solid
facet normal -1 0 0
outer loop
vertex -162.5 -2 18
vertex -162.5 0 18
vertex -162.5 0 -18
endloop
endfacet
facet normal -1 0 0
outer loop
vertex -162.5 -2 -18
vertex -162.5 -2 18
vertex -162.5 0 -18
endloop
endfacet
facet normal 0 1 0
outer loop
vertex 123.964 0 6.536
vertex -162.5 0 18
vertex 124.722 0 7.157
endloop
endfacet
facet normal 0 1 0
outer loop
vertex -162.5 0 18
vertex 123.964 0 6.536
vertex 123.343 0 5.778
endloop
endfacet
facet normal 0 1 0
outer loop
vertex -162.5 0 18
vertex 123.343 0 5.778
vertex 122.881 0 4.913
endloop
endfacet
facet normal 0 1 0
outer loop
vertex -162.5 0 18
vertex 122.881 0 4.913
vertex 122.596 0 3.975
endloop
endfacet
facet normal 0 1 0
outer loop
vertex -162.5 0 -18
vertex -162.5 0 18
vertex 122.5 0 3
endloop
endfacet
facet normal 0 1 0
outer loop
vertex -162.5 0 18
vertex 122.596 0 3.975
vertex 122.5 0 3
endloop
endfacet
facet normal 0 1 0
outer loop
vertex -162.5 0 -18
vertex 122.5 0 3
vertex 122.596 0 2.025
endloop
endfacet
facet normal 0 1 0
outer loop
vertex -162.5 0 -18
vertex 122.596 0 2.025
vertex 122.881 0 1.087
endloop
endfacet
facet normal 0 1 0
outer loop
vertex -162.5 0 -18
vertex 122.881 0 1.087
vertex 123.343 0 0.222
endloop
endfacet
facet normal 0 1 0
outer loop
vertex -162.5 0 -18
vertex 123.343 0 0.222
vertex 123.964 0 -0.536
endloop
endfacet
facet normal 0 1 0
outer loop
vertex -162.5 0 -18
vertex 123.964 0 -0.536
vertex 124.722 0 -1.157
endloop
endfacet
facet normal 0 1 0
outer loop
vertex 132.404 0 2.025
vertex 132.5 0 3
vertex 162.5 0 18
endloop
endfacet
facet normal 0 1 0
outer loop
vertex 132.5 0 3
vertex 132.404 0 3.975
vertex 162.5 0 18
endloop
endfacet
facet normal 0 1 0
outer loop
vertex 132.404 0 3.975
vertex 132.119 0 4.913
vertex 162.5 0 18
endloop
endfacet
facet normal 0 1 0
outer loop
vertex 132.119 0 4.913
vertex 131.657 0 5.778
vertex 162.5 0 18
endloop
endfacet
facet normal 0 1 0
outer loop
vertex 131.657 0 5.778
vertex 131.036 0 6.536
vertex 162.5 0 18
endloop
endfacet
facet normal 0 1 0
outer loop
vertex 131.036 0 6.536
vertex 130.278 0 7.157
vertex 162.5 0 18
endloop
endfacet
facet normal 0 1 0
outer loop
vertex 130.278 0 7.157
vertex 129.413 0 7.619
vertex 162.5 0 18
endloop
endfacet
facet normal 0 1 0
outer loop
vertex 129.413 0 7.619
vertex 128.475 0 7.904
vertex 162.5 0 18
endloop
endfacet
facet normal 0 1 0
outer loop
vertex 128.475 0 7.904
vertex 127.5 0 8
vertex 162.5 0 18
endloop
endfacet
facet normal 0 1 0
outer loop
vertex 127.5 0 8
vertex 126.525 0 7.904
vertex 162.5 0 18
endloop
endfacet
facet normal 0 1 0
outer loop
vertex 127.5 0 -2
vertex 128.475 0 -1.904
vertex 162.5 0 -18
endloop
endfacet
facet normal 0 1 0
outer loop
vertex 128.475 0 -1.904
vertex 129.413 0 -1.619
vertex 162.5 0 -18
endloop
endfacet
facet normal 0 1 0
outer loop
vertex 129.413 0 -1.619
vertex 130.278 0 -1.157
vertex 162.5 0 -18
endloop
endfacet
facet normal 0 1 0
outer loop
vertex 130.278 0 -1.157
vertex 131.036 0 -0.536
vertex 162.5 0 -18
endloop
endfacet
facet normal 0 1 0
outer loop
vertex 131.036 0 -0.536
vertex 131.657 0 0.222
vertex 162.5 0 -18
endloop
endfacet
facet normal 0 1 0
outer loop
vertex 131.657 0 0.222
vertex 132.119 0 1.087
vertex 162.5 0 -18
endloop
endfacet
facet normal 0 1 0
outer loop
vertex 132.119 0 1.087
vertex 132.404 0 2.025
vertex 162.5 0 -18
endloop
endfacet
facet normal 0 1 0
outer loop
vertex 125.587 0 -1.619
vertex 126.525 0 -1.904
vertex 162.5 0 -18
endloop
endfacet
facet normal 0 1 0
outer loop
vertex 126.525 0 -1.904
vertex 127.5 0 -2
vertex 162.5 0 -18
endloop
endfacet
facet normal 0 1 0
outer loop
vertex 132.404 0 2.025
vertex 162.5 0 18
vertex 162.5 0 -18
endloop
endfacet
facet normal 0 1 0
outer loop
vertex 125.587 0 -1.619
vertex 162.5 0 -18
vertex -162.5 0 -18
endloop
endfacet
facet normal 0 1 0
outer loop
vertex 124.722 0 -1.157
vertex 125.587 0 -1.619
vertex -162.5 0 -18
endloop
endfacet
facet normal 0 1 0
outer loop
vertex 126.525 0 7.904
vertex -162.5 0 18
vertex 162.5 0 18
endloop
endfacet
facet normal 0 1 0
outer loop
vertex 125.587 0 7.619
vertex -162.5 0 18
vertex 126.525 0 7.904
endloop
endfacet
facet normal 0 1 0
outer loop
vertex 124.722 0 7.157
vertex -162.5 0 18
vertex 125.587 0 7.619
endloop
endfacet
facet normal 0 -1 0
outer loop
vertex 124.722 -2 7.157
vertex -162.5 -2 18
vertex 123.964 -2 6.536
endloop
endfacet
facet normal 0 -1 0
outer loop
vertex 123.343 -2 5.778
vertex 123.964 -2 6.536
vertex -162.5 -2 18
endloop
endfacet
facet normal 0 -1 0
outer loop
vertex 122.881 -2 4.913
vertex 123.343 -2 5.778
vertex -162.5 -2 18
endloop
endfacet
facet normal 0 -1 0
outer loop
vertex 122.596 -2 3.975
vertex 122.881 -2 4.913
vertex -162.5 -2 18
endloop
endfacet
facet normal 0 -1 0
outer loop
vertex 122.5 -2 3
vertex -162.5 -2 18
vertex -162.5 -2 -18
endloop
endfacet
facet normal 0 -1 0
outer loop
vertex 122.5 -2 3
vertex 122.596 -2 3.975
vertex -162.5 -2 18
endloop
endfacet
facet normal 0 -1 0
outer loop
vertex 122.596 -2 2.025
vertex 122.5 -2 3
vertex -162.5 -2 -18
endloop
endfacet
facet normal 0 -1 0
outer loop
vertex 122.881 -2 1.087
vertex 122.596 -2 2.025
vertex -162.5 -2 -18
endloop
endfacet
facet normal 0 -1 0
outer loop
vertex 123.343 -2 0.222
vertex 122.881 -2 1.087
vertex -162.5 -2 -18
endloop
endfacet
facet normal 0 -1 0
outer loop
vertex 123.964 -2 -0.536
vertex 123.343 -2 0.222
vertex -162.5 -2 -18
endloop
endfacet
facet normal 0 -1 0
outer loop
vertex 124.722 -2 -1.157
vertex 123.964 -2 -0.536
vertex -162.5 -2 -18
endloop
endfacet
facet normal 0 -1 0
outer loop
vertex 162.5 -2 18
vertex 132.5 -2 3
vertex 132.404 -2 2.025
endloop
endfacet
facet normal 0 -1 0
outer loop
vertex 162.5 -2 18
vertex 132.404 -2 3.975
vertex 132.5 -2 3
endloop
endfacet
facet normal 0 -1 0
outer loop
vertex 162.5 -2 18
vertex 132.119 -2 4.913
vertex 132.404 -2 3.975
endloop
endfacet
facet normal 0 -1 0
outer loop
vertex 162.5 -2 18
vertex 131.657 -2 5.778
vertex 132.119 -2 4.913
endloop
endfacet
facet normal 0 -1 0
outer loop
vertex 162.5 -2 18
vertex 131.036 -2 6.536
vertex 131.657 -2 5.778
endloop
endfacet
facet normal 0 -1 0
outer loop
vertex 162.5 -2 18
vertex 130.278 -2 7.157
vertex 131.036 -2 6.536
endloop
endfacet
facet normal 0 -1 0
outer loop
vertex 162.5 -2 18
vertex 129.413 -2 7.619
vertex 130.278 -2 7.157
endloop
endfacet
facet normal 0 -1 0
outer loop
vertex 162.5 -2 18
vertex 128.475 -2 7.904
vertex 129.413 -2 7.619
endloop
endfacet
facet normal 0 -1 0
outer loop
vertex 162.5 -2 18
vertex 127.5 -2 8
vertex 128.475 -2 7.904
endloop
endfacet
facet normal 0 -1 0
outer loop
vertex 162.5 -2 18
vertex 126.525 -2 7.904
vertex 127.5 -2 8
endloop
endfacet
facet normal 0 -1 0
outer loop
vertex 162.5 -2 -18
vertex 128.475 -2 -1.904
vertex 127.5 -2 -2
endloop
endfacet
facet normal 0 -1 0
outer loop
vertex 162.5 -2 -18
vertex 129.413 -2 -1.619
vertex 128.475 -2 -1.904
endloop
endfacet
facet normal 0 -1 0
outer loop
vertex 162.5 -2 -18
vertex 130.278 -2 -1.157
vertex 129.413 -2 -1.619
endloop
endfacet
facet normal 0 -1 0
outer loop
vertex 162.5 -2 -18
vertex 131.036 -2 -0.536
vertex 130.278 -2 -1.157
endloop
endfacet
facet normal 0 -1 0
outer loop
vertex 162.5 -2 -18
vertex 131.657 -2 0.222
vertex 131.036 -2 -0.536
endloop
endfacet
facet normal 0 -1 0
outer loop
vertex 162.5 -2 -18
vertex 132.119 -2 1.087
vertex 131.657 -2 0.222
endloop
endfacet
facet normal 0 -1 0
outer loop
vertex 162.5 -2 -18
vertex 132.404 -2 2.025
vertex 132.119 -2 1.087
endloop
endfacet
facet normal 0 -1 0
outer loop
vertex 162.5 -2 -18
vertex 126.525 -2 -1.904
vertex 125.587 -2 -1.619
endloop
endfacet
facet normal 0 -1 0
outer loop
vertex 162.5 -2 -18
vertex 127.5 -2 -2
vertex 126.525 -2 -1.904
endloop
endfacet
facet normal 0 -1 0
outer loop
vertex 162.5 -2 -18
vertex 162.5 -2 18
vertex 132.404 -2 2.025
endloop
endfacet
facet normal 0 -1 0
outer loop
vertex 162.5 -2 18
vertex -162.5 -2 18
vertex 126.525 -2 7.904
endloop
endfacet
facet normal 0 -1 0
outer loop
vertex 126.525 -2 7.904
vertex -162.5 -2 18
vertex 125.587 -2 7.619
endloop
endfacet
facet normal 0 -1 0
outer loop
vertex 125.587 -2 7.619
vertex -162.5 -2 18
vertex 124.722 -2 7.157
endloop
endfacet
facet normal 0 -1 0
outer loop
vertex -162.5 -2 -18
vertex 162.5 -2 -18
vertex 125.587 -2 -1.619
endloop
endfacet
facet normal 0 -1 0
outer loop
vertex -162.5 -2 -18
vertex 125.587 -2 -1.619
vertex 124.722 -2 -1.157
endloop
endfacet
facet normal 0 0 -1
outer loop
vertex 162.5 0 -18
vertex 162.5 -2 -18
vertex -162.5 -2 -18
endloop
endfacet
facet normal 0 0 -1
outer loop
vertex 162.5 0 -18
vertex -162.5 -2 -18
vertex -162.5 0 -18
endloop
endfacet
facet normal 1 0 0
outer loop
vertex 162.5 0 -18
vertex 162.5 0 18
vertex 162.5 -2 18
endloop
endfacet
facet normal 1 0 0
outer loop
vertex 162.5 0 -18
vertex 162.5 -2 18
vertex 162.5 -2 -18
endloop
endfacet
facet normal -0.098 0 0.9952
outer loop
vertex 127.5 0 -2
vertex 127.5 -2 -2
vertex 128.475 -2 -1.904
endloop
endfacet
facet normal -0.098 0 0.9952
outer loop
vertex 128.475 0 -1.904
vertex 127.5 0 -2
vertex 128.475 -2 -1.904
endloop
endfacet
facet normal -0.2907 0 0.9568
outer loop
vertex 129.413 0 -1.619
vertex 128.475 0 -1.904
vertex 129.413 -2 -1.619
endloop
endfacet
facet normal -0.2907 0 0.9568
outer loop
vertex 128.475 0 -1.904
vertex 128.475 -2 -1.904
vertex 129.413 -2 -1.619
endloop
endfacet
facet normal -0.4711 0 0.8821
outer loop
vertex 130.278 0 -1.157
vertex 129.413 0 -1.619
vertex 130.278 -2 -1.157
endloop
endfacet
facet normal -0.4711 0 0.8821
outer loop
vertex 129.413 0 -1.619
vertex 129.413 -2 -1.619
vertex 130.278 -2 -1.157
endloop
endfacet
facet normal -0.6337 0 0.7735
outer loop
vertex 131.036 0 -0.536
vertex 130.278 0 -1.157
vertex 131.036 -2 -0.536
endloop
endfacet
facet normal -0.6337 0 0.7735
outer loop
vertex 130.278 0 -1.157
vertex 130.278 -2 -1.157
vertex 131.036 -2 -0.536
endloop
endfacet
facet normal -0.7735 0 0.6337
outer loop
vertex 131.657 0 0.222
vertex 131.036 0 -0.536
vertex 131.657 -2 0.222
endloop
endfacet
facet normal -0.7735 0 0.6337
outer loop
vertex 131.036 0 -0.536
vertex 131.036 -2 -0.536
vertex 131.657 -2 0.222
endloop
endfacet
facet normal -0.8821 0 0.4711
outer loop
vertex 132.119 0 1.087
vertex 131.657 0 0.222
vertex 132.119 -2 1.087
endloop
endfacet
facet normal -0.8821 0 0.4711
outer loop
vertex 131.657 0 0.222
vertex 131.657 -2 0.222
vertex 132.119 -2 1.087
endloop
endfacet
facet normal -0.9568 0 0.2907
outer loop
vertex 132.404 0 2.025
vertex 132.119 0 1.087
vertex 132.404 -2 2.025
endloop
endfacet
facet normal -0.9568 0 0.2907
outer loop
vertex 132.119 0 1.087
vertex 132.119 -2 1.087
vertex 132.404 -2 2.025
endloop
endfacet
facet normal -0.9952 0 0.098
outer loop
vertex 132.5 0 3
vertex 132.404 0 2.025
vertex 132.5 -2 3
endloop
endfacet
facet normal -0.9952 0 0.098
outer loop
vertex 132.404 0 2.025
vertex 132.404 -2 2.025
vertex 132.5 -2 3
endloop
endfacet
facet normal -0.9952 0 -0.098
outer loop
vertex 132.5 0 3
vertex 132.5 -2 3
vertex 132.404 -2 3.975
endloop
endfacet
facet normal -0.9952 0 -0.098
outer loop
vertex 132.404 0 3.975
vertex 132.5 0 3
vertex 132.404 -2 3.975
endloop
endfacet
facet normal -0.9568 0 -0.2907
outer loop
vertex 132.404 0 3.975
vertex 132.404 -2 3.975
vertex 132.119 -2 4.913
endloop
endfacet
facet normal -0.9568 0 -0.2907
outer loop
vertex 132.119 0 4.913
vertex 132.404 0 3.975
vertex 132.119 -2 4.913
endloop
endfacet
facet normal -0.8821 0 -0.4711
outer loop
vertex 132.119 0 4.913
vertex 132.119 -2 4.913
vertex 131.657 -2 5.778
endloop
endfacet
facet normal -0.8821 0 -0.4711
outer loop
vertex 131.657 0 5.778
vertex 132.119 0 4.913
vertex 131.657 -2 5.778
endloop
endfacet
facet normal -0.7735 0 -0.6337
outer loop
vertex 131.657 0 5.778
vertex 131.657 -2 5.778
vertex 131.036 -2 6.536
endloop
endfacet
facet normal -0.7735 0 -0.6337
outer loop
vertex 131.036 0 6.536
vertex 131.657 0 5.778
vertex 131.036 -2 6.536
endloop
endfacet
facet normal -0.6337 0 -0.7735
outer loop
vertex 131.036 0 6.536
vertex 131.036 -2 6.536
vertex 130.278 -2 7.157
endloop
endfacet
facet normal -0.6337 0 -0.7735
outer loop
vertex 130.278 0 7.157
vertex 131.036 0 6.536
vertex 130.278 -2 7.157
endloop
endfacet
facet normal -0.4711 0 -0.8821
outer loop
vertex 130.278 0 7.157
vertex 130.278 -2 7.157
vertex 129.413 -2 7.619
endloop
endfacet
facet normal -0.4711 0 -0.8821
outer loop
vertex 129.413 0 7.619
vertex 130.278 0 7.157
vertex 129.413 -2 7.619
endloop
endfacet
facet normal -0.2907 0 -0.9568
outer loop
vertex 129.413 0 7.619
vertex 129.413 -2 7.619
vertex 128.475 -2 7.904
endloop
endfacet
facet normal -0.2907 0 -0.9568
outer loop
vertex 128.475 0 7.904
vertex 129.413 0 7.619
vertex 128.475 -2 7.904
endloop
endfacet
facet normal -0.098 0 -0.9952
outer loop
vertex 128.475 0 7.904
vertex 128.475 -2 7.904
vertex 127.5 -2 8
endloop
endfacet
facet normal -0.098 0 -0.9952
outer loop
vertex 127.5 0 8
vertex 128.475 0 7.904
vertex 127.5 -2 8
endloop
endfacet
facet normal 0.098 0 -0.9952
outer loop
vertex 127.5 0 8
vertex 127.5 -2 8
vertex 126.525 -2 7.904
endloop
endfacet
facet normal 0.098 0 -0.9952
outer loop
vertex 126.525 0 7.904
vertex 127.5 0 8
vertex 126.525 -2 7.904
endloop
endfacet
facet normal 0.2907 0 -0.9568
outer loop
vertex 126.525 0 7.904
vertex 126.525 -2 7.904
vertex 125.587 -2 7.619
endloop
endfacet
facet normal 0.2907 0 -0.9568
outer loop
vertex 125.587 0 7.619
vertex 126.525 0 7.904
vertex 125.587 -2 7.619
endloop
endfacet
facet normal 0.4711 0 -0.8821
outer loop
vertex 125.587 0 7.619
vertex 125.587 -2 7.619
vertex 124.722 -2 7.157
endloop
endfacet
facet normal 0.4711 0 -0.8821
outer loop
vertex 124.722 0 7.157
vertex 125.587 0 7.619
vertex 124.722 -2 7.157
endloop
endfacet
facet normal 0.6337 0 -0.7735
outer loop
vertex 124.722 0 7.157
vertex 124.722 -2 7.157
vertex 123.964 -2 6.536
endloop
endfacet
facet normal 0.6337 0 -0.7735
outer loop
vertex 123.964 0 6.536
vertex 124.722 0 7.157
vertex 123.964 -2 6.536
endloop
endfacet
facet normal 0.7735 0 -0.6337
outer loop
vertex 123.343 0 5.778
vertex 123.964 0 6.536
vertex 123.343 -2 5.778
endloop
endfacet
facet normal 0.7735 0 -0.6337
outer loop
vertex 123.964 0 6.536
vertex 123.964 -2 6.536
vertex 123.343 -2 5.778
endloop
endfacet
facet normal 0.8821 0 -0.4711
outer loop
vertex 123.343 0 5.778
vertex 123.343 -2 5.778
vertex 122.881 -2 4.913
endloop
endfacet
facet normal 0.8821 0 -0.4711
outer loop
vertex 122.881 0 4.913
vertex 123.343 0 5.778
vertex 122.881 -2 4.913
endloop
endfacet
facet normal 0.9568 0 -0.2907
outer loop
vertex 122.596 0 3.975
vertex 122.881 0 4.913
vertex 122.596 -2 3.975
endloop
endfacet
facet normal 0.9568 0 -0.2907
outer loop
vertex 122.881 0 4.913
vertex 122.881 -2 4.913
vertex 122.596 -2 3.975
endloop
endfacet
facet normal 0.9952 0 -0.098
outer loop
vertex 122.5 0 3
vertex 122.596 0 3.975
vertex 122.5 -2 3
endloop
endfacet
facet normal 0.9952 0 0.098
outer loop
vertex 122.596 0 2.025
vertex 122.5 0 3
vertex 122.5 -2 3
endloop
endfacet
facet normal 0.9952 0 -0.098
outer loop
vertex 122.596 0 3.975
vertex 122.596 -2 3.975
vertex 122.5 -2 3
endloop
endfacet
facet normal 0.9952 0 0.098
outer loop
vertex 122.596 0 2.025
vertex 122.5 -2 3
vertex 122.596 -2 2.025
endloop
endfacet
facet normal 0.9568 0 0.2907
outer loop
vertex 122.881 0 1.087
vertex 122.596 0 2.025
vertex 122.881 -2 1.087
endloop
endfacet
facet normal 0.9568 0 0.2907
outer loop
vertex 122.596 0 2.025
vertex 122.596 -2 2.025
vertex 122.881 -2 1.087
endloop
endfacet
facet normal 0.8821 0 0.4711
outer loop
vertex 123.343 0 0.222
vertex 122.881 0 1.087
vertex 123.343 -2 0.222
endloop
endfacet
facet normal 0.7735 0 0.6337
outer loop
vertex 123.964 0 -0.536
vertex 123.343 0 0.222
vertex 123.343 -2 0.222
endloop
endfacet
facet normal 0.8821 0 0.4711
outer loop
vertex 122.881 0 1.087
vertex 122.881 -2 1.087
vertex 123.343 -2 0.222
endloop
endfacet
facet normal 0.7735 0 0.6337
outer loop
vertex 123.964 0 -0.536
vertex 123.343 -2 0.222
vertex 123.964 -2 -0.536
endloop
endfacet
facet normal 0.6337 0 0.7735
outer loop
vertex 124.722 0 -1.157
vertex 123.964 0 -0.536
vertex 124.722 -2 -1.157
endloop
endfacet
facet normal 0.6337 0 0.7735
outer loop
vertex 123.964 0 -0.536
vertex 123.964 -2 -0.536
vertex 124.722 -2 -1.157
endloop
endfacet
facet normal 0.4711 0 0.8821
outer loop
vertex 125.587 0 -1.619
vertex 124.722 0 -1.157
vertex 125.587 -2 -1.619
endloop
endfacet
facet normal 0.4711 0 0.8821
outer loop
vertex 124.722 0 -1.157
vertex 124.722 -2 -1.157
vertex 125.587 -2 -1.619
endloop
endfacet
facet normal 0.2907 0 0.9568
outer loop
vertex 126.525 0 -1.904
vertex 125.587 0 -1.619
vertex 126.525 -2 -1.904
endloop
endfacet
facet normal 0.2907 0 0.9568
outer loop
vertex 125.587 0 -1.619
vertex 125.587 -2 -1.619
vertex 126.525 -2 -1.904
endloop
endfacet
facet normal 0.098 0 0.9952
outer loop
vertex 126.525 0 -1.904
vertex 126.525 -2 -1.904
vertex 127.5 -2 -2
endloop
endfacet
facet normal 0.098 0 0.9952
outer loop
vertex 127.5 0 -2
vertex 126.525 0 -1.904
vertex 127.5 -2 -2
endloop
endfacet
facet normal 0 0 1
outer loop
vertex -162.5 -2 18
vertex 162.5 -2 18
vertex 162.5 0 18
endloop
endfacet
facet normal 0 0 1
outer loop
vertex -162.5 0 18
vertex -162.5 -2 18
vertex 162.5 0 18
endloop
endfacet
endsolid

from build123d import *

# Parameters (mm, degrees)
ESBO_O1_W             = 36
ESBO_O1_H             = 2
FLANGE_BASE2_DEPTH    = 162.5
ESBO_O13_R            = 5
CORTE_EXTRUS_O4_DEPTH = 164.506116094


# Sheet-metal steps are written as plain solids
with BuildPart() as part:
    # Esboço1 → Flange-base2 (new, symmetric)
    with BuildSketch(Plane(origin=(0, 0, 0), x_dir=(0, 0, -1), z_dir=(1, 0, 0))):
        with Locations((0, -1)):
            Rectangle(ESBO_O1_W, ESBO_O1_H)
    extrude(amount=FLANGE_BASE2_DEPTH, both=True)

    # Esboço13 → Corte-extrusão4 (cut, through all)
    with BuildSketch(Plane.XZ.offset(2)):
        with Locations(Location((127.5, 3, 0), (0, 0, 270))):
            Circle(ESBO_O13_R)
    extrude(amount=-CORTE_EXTRUS_O4_DEPTH, mode=Mode.SUBTRACT)


solid = part.part
